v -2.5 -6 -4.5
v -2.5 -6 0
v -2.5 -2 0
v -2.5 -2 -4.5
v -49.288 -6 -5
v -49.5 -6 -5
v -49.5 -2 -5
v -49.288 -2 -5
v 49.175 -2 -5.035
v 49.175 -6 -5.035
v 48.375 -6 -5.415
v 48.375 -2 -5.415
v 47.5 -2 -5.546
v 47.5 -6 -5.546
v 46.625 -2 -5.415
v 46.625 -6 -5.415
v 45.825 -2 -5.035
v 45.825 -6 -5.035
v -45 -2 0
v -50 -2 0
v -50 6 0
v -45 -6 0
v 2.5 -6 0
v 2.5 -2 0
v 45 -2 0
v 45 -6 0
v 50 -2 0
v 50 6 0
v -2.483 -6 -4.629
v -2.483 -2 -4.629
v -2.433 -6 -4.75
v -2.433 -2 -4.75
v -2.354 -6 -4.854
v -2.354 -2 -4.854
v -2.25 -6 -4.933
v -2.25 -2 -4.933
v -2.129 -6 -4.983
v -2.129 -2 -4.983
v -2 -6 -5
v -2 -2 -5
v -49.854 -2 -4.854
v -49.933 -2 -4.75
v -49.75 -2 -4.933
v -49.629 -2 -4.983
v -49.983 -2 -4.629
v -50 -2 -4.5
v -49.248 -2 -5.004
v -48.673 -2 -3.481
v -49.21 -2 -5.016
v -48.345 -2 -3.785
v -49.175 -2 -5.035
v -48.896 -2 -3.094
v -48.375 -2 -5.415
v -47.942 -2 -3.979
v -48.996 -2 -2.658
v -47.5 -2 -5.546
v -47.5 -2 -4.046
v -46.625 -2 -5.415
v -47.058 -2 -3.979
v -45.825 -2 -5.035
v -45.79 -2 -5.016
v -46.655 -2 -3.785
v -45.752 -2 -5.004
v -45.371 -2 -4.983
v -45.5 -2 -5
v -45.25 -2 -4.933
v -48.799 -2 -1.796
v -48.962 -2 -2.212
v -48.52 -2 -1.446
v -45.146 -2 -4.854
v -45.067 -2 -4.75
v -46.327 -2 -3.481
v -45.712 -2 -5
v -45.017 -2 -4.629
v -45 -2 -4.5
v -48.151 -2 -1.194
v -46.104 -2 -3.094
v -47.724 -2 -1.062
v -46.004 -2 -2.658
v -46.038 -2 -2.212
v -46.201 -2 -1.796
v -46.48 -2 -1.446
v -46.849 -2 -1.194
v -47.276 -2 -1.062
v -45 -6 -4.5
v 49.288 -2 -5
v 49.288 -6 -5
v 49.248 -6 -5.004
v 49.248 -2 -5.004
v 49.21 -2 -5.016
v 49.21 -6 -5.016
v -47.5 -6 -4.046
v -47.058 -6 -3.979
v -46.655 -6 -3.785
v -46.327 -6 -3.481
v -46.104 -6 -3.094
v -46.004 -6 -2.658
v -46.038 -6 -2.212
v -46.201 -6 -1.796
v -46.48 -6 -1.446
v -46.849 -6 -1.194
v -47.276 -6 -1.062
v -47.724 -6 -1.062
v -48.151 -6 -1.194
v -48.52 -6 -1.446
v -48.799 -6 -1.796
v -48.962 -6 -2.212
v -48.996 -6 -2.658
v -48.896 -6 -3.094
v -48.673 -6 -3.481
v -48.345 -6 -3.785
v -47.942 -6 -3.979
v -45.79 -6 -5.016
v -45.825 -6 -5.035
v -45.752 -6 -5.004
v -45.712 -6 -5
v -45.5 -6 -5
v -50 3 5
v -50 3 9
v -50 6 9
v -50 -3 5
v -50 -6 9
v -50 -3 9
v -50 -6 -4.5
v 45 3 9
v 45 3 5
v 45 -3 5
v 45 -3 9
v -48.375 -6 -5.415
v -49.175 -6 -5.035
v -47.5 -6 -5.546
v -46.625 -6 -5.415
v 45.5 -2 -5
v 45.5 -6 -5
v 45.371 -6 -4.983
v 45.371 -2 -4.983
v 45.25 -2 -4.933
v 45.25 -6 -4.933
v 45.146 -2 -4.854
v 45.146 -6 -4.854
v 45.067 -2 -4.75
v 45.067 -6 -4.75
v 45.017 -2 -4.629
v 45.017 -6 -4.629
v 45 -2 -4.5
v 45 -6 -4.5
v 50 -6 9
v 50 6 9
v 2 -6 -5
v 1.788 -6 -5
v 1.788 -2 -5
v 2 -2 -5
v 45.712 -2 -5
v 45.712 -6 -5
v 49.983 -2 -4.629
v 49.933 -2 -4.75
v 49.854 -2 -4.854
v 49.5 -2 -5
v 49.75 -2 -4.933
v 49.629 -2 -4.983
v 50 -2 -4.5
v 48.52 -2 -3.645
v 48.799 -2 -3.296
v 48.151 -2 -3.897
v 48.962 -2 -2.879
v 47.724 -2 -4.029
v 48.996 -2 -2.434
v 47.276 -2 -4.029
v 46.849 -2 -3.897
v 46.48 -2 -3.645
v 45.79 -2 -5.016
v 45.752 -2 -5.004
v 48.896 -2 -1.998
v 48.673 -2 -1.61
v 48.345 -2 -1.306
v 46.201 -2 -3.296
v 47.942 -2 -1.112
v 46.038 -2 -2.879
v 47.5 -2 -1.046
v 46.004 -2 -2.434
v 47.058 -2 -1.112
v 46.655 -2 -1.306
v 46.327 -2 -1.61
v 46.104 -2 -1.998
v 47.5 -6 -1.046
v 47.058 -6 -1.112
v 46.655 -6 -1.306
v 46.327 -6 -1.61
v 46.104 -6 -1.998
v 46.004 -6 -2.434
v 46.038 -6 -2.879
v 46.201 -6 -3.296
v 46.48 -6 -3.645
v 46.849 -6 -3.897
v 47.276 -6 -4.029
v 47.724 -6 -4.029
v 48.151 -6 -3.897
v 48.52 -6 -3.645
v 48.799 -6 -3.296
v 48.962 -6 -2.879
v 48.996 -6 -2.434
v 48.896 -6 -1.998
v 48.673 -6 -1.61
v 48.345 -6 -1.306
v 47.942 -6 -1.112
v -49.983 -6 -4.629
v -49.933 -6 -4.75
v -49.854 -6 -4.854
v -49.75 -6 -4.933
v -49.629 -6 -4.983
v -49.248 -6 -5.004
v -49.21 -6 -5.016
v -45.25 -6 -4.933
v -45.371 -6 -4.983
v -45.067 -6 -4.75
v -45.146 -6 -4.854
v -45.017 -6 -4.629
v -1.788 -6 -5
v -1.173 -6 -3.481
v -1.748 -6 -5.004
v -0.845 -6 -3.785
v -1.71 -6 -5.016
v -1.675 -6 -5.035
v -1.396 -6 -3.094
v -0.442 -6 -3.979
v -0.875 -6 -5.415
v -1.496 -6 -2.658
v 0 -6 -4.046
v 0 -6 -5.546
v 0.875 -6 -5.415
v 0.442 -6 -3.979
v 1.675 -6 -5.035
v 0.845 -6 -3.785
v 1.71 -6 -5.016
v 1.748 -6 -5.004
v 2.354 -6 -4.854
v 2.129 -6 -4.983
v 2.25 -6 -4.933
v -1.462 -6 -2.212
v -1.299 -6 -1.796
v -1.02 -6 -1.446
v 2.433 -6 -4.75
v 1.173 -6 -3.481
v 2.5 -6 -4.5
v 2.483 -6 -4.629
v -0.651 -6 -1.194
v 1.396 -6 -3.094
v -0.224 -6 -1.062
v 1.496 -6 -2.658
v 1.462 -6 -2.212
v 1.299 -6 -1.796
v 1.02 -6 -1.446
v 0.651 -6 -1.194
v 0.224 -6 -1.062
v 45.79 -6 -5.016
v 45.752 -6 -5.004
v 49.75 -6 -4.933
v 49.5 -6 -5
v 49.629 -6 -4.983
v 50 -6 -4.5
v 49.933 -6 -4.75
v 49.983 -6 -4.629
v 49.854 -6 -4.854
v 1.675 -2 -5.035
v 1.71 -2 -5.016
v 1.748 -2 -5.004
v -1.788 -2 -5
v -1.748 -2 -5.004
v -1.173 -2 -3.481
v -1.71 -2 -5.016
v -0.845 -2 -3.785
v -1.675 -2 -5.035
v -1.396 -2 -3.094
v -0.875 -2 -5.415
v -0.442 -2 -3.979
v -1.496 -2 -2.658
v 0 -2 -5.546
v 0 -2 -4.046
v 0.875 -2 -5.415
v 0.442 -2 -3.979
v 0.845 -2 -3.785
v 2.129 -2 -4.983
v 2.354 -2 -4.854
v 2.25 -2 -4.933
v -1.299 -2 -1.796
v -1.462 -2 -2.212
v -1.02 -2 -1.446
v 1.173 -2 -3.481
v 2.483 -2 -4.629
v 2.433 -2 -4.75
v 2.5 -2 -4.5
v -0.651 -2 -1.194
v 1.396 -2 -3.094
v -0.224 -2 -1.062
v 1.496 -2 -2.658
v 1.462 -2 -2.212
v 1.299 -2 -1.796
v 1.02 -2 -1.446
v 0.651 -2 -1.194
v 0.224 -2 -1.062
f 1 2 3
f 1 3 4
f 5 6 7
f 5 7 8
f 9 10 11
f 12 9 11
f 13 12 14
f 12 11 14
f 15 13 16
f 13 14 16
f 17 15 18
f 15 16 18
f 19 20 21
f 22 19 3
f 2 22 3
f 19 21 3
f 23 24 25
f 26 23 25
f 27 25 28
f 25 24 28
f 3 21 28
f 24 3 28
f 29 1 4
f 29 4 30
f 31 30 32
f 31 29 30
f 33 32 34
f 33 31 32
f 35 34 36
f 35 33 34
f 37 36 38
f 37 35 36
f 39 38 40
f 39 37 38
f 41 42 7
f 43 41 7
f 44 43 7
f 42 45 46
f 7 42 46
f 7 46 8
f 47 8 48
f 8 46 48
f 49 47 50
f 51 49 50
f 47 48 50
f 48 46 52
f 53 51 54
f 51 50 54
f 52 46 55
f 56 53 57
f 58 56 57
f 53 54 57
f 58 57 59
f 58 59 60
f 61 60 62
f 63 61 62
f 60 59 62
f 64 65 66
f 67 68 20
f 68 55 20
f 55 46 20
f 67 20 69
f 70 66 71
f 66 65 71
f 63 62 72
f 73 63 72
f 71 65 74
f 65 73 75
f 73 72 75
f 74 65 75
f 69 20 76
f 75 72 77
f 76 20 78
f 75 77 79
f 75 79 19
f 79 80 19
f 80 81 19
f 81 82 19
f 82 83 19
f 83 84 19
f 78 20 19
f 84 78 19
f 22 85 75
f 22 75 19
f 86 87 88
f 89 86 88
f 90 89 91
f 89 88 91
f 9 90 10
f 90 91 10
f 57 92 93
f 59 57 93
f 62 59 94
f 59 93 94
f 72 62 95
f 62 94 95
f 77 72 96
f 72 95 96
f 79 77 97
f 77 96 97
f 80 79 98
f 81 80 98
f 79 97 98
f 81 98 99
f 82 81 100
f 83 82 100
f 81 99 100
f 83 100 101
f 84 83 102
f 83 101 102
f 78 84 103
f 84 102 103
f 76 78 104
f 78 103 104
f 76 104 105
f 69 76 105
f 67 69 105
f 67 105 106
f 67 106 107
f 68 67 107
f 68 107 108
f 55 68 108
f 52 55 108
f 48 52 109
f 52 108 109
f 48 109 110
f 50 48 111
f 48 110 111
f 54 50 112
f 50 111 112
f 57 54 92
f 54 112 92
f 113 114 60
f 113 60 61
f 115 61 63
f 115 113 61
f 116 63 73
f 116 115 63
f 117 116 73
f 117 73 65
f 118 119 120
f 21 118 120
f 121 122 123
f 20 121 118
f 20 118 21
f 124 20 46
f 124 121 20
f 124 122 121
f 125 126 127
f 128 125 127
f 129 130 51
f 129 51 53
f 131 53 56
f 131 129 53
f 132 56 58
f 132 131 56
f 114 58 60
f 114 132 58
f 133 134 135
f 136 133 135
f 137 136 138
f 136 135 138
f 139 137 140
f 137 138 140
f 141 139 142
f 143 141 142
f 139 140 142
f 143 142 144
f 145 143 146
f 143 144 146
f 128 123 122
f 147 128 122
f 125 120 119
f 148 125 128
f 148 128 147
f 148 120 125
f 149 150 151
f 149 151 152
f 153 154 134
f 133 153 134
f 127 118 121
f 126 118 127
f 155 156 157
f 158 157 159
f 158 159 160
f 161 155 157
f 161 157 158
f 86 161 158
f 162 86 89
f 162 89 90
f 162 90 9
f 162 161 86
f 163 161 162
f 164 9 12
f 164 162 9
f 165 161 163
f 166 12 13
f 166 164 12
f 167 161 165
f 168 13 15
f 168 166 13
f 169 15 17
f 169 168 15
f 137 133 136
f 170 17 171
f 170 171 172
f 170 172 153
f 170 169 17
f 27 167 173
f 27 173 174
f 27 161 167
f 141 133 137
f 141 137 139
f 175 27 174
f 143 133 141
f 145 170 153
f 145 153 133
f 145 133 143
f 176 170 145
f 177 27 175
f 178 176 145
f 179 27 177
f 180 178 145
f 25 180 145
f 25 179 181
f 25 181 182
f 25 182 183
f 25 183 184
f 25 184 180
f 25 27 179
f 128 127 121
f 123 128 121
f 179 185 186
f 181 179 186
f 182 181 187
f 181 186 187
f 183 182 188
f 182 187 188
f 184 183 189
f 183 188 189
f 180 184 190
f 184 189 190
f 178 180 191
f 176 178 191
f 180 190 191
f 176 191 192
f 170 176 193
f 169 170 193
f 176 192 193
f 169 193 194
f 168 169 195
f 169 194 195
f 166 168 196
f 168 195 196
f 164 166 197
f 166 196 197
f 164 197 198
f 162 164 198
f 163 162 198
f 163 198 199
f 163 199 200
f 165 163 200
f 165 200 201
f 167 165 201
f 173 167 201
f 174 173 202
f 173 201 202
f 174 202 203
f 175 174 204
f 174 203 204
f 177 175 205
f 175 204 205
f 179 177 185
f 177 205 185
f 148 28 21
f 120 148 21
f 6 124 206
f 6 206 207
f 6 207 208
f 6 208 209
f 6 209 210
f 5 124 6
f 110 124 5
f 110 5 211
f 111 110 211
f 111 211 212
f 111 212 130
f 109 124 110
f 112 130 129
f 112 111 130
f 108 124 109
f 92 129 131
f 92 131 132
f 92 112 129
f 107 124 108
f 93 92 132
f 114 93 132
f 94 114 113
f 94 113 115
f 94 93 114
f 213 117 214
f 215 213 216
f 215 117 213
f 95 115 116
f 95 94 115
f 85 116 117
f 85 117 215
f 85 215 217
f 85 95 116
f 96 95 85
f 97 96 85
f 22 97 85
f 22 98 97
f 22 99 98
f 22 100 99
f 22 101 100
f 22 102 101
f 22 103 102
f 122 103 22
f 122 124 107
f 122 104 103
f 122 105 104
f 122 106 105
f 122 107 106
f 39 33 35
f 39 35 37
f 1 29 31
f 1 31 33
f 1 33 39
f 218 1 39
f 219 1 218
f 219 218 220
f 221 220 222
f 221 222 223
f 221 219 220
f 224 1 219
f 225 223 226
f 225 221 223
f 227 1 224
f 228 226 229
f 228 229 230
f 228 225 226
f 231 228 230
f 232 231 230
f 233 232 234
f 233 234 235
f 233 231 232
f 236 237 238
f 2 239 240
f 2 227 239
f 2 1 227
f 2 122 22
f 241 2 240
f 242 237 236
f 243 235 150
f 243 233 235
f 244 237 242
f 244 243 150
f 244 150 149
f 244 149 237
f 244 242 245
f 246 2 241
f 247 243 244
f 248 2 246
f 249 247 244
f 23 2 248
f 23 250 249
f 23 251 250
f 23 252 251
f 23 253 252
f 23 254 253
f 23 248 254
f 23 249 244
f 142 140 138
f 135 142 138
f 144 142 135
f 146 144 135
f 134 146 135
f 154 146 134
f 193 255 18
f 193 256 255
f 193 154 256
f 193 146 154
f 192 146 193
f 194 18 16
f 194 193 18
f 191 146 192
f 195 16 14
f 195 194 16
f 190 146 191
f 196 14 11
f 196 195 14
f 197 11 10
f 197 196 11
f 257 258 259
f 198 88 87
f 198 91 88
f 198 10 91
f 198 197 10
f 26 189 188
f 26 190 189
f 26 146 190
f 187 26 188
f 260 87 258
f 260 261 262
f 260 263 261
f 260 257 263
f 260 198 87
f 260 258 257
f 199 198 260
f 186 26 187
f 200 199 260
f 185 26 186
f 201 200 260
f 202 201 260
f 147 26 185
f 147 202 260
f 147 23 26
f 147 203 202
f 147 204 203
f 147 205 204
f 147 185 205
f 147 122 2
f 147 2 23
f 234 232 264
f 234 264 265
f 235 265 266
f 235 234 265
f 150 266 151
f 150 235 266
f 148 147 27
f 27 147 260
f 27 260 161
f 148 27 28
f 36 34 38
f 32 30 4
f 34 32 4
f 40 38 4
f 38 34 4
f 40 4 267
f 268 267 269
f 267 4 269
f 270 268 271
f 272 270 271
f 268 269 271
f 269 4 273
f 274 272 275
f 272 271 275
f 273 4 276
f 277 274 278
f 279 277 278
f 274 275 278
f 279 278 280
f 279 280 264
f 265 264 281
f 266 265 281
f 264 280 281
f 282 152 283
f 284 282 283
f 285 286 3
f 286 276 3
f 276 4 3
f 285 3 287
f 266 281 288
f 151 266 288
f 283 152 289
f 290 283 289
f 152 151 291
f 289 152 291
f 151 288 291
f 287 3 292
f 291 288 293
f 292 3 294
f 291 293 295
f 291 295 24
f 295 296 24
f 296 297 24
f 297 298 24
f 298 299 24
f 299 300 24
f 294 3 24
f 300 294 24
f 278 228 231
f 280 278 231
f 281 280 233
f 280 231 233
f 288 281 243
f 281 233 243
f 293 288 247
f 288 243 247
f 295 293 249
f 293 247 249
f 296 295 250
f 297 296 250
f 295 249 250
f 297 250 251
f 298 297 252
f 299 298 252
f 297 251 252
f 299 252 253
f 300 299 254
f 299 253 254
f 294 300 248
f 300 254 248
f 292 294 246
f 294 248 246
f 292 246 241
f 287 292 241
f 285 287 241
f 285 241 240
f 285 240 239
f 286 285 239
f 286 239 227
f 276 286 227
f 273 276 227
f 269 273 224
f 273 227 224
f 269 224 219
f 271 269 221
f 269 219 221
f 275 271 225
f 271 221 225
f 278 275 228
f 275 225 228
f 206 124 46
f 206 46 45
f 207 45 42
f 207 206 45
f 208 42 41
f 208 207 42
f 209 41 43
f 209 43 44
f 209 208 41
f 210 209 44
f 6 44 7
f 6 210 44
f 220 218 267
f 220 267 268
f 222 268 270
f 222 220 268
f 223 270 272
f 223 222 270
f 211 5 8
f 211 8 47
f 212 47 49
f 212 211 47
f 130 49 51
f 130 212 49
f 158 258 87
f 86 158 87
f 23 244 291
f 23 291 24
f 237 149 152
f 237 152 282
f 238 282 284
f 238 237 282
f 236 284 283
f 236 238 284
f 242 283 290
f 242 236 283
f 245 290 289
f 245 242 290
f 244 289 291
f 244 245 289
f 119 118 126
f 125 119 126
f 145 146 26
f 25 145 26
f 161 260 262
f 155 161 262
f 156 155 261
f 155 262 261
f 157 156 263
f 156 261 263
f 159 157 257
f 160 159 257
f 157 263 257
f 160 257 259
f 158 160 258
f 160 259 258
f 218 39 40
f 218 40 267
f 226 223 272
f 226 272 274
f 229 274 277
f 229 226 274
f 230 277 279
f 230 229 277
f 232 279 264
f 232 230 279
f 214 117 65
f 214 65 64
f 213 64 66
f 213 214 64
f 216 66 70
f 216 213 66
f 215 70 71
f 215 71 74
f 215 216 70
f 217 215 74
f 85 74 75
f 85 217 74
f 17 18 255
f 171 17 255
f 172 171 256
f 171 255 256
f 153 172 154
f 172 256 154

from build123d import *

# Parameters (mm, degrees)
ESQUISSE1_W        = 100
ESQUISSE1_H        = 12
BOSS_EXTRU_1_DEPTH = 5
BOSS_EXTRU_2_DEPTH = 4
ESQUISSE3_R        = 1.5
BOSS_EXTRU_3_DEPTH = 4


with BuildPart() as part:
    # Esquisse1 → Boss.-Extru.1 (new body)
    with BuildSketch(Plane.XY):
        Rectangle(ESQUISSE1_W, ESQUISSE1_H)
    extrude(amount=BOSS_EXTRU_1_DEPTH)

    # Esquisse2 → Boss.-Extru.2 (add)
    with BuildSketch(Plane.XY.offset(5)):
        Polygon((-50, 3), (45, 3), (45, -3), (-50, -3), (-50, -6), (50, -6), (50, 6), (-50, 6), align=None)
    extrude(amount=BOSS_EXTRU_2_DEPTH)

    # Esquisse3 → Boss.-Extru.3 (add)
    # profile 1 of 3: a face of its own
    with BuildSketch(Plane.XZ.offset(6)):
        with BuildLine():
            Line((-45.71168799, -5), (-45.5, -5))
            ThreePointArc((-45.5, -5), (-45.146446609, -4.853553391), (-45, -4.5))
            Line((-45, -4.5), (-45, 0))
            Line((-45, 0), (-50, 0))
            Line((-50, 0), (-50, -4.5))
            ThreePointArc((-50, -4.5), (-49.853553391, -4.853553391), (-49.5, -5))
            Line((-49.5, -5), (-49.28831201, -5))
            ThreePointArc((-49.28831201, -5), (-49.22893784, -5.008856171), (-49.174732569, -5.034653697))
            ThreePointArc((-49.174732569, -5.034653697), (-47.5, -5.545623601), (-45.825267431, -5.034653697))
            ThreePointArc((-45.825267431, -5.034653697), (-45.77106216, -5.008856171), (-45.71168799, -5))
        make_face()
        with Locations(Location((-47.5, -2.545623601, 0), (0, 0, 270))):
            Circle(ESQUISSE3_R, mode=Mode.SUBTRACT)
    # profile 2 of 3: a face of its own
    with BuildSketch(Plane.XZ.offset(6)):
        with BuildLine():
            Line((49.5, -5), (49.28831201, -5))
            ThreePointArc((49.28831201, -5), (49.22893784, -5.008856171), (49.174732569, -5.034653697))
            ThreePointArc((49.174732569, -5.034653697), (47.5, -5.545623601), (45.825267431, -5.034653697))
            ThreePointArc((45.825267431, -5.034653697), (45.77106216, -5.008856171), (45.71168799, -5))
            Line((45.71168799, -5), (45.5, -5))
            ThreePointArc((45.5, -5), (45.146446609, -4.853553391), (45, -4.5))
            Line((45, -4.5), (45, 0))
            Line((45, 0), (50, 0))
            Line((50, 0), (50, -4.5))
            ThreePointArc((50, -4.5), (49.853553391, -4.853553391), (49.5, -5))
        make_face()
        with Locations(Location((47.5, -2.545623601, 0), (0, 0, 90))):
            Circle(ESQUISSE3_R, mode=Mode.SUBTRACT)
    # profile 3 of 3: a face of its own
    with BuildSketch(Plane.XZ.offset(6)):
        with BuildLine():
            Line((-2.5, 0), (-2.5, -4.5))
            ThreePointArc((-2.5, -4.5), (-2.353553391, -4.853553391), (-2, -5))
            Line((-2, -5), (-1.78831201, -5))
            ThreePointArc((-1.78831201, -5), (-1.72893784, -5.008856171), (-1.674732569, -5.034653697))
            ThreePointArc((-1.674732569, -5.034653697), (0, -5.545623601), (1.674732569, -5.034653697))
            ThreePointArc((1.674732569, -5.034653697), (1.72893784, -5.008856171), (1.78831201, -5))
            Line((1.78831201, -5), (2, -5))
            ThreePointArc((2, -5), (2.353553391, -4.853553391), (2.5, -4.5))
            Line((2.5, -4.5), (2.5, 0))
            Line((2.5, 0), (-2.5, 0))
        make_face()
        with Locations(Location((0, -2.545623601, 0), (0, 0, 270))):
            Circle(ESQUISSE3_R, mode=Mode.SUBTRACT)
    extrude(amount=-BOSS_EXTRU_3_DEPTH)


solid = part.part
